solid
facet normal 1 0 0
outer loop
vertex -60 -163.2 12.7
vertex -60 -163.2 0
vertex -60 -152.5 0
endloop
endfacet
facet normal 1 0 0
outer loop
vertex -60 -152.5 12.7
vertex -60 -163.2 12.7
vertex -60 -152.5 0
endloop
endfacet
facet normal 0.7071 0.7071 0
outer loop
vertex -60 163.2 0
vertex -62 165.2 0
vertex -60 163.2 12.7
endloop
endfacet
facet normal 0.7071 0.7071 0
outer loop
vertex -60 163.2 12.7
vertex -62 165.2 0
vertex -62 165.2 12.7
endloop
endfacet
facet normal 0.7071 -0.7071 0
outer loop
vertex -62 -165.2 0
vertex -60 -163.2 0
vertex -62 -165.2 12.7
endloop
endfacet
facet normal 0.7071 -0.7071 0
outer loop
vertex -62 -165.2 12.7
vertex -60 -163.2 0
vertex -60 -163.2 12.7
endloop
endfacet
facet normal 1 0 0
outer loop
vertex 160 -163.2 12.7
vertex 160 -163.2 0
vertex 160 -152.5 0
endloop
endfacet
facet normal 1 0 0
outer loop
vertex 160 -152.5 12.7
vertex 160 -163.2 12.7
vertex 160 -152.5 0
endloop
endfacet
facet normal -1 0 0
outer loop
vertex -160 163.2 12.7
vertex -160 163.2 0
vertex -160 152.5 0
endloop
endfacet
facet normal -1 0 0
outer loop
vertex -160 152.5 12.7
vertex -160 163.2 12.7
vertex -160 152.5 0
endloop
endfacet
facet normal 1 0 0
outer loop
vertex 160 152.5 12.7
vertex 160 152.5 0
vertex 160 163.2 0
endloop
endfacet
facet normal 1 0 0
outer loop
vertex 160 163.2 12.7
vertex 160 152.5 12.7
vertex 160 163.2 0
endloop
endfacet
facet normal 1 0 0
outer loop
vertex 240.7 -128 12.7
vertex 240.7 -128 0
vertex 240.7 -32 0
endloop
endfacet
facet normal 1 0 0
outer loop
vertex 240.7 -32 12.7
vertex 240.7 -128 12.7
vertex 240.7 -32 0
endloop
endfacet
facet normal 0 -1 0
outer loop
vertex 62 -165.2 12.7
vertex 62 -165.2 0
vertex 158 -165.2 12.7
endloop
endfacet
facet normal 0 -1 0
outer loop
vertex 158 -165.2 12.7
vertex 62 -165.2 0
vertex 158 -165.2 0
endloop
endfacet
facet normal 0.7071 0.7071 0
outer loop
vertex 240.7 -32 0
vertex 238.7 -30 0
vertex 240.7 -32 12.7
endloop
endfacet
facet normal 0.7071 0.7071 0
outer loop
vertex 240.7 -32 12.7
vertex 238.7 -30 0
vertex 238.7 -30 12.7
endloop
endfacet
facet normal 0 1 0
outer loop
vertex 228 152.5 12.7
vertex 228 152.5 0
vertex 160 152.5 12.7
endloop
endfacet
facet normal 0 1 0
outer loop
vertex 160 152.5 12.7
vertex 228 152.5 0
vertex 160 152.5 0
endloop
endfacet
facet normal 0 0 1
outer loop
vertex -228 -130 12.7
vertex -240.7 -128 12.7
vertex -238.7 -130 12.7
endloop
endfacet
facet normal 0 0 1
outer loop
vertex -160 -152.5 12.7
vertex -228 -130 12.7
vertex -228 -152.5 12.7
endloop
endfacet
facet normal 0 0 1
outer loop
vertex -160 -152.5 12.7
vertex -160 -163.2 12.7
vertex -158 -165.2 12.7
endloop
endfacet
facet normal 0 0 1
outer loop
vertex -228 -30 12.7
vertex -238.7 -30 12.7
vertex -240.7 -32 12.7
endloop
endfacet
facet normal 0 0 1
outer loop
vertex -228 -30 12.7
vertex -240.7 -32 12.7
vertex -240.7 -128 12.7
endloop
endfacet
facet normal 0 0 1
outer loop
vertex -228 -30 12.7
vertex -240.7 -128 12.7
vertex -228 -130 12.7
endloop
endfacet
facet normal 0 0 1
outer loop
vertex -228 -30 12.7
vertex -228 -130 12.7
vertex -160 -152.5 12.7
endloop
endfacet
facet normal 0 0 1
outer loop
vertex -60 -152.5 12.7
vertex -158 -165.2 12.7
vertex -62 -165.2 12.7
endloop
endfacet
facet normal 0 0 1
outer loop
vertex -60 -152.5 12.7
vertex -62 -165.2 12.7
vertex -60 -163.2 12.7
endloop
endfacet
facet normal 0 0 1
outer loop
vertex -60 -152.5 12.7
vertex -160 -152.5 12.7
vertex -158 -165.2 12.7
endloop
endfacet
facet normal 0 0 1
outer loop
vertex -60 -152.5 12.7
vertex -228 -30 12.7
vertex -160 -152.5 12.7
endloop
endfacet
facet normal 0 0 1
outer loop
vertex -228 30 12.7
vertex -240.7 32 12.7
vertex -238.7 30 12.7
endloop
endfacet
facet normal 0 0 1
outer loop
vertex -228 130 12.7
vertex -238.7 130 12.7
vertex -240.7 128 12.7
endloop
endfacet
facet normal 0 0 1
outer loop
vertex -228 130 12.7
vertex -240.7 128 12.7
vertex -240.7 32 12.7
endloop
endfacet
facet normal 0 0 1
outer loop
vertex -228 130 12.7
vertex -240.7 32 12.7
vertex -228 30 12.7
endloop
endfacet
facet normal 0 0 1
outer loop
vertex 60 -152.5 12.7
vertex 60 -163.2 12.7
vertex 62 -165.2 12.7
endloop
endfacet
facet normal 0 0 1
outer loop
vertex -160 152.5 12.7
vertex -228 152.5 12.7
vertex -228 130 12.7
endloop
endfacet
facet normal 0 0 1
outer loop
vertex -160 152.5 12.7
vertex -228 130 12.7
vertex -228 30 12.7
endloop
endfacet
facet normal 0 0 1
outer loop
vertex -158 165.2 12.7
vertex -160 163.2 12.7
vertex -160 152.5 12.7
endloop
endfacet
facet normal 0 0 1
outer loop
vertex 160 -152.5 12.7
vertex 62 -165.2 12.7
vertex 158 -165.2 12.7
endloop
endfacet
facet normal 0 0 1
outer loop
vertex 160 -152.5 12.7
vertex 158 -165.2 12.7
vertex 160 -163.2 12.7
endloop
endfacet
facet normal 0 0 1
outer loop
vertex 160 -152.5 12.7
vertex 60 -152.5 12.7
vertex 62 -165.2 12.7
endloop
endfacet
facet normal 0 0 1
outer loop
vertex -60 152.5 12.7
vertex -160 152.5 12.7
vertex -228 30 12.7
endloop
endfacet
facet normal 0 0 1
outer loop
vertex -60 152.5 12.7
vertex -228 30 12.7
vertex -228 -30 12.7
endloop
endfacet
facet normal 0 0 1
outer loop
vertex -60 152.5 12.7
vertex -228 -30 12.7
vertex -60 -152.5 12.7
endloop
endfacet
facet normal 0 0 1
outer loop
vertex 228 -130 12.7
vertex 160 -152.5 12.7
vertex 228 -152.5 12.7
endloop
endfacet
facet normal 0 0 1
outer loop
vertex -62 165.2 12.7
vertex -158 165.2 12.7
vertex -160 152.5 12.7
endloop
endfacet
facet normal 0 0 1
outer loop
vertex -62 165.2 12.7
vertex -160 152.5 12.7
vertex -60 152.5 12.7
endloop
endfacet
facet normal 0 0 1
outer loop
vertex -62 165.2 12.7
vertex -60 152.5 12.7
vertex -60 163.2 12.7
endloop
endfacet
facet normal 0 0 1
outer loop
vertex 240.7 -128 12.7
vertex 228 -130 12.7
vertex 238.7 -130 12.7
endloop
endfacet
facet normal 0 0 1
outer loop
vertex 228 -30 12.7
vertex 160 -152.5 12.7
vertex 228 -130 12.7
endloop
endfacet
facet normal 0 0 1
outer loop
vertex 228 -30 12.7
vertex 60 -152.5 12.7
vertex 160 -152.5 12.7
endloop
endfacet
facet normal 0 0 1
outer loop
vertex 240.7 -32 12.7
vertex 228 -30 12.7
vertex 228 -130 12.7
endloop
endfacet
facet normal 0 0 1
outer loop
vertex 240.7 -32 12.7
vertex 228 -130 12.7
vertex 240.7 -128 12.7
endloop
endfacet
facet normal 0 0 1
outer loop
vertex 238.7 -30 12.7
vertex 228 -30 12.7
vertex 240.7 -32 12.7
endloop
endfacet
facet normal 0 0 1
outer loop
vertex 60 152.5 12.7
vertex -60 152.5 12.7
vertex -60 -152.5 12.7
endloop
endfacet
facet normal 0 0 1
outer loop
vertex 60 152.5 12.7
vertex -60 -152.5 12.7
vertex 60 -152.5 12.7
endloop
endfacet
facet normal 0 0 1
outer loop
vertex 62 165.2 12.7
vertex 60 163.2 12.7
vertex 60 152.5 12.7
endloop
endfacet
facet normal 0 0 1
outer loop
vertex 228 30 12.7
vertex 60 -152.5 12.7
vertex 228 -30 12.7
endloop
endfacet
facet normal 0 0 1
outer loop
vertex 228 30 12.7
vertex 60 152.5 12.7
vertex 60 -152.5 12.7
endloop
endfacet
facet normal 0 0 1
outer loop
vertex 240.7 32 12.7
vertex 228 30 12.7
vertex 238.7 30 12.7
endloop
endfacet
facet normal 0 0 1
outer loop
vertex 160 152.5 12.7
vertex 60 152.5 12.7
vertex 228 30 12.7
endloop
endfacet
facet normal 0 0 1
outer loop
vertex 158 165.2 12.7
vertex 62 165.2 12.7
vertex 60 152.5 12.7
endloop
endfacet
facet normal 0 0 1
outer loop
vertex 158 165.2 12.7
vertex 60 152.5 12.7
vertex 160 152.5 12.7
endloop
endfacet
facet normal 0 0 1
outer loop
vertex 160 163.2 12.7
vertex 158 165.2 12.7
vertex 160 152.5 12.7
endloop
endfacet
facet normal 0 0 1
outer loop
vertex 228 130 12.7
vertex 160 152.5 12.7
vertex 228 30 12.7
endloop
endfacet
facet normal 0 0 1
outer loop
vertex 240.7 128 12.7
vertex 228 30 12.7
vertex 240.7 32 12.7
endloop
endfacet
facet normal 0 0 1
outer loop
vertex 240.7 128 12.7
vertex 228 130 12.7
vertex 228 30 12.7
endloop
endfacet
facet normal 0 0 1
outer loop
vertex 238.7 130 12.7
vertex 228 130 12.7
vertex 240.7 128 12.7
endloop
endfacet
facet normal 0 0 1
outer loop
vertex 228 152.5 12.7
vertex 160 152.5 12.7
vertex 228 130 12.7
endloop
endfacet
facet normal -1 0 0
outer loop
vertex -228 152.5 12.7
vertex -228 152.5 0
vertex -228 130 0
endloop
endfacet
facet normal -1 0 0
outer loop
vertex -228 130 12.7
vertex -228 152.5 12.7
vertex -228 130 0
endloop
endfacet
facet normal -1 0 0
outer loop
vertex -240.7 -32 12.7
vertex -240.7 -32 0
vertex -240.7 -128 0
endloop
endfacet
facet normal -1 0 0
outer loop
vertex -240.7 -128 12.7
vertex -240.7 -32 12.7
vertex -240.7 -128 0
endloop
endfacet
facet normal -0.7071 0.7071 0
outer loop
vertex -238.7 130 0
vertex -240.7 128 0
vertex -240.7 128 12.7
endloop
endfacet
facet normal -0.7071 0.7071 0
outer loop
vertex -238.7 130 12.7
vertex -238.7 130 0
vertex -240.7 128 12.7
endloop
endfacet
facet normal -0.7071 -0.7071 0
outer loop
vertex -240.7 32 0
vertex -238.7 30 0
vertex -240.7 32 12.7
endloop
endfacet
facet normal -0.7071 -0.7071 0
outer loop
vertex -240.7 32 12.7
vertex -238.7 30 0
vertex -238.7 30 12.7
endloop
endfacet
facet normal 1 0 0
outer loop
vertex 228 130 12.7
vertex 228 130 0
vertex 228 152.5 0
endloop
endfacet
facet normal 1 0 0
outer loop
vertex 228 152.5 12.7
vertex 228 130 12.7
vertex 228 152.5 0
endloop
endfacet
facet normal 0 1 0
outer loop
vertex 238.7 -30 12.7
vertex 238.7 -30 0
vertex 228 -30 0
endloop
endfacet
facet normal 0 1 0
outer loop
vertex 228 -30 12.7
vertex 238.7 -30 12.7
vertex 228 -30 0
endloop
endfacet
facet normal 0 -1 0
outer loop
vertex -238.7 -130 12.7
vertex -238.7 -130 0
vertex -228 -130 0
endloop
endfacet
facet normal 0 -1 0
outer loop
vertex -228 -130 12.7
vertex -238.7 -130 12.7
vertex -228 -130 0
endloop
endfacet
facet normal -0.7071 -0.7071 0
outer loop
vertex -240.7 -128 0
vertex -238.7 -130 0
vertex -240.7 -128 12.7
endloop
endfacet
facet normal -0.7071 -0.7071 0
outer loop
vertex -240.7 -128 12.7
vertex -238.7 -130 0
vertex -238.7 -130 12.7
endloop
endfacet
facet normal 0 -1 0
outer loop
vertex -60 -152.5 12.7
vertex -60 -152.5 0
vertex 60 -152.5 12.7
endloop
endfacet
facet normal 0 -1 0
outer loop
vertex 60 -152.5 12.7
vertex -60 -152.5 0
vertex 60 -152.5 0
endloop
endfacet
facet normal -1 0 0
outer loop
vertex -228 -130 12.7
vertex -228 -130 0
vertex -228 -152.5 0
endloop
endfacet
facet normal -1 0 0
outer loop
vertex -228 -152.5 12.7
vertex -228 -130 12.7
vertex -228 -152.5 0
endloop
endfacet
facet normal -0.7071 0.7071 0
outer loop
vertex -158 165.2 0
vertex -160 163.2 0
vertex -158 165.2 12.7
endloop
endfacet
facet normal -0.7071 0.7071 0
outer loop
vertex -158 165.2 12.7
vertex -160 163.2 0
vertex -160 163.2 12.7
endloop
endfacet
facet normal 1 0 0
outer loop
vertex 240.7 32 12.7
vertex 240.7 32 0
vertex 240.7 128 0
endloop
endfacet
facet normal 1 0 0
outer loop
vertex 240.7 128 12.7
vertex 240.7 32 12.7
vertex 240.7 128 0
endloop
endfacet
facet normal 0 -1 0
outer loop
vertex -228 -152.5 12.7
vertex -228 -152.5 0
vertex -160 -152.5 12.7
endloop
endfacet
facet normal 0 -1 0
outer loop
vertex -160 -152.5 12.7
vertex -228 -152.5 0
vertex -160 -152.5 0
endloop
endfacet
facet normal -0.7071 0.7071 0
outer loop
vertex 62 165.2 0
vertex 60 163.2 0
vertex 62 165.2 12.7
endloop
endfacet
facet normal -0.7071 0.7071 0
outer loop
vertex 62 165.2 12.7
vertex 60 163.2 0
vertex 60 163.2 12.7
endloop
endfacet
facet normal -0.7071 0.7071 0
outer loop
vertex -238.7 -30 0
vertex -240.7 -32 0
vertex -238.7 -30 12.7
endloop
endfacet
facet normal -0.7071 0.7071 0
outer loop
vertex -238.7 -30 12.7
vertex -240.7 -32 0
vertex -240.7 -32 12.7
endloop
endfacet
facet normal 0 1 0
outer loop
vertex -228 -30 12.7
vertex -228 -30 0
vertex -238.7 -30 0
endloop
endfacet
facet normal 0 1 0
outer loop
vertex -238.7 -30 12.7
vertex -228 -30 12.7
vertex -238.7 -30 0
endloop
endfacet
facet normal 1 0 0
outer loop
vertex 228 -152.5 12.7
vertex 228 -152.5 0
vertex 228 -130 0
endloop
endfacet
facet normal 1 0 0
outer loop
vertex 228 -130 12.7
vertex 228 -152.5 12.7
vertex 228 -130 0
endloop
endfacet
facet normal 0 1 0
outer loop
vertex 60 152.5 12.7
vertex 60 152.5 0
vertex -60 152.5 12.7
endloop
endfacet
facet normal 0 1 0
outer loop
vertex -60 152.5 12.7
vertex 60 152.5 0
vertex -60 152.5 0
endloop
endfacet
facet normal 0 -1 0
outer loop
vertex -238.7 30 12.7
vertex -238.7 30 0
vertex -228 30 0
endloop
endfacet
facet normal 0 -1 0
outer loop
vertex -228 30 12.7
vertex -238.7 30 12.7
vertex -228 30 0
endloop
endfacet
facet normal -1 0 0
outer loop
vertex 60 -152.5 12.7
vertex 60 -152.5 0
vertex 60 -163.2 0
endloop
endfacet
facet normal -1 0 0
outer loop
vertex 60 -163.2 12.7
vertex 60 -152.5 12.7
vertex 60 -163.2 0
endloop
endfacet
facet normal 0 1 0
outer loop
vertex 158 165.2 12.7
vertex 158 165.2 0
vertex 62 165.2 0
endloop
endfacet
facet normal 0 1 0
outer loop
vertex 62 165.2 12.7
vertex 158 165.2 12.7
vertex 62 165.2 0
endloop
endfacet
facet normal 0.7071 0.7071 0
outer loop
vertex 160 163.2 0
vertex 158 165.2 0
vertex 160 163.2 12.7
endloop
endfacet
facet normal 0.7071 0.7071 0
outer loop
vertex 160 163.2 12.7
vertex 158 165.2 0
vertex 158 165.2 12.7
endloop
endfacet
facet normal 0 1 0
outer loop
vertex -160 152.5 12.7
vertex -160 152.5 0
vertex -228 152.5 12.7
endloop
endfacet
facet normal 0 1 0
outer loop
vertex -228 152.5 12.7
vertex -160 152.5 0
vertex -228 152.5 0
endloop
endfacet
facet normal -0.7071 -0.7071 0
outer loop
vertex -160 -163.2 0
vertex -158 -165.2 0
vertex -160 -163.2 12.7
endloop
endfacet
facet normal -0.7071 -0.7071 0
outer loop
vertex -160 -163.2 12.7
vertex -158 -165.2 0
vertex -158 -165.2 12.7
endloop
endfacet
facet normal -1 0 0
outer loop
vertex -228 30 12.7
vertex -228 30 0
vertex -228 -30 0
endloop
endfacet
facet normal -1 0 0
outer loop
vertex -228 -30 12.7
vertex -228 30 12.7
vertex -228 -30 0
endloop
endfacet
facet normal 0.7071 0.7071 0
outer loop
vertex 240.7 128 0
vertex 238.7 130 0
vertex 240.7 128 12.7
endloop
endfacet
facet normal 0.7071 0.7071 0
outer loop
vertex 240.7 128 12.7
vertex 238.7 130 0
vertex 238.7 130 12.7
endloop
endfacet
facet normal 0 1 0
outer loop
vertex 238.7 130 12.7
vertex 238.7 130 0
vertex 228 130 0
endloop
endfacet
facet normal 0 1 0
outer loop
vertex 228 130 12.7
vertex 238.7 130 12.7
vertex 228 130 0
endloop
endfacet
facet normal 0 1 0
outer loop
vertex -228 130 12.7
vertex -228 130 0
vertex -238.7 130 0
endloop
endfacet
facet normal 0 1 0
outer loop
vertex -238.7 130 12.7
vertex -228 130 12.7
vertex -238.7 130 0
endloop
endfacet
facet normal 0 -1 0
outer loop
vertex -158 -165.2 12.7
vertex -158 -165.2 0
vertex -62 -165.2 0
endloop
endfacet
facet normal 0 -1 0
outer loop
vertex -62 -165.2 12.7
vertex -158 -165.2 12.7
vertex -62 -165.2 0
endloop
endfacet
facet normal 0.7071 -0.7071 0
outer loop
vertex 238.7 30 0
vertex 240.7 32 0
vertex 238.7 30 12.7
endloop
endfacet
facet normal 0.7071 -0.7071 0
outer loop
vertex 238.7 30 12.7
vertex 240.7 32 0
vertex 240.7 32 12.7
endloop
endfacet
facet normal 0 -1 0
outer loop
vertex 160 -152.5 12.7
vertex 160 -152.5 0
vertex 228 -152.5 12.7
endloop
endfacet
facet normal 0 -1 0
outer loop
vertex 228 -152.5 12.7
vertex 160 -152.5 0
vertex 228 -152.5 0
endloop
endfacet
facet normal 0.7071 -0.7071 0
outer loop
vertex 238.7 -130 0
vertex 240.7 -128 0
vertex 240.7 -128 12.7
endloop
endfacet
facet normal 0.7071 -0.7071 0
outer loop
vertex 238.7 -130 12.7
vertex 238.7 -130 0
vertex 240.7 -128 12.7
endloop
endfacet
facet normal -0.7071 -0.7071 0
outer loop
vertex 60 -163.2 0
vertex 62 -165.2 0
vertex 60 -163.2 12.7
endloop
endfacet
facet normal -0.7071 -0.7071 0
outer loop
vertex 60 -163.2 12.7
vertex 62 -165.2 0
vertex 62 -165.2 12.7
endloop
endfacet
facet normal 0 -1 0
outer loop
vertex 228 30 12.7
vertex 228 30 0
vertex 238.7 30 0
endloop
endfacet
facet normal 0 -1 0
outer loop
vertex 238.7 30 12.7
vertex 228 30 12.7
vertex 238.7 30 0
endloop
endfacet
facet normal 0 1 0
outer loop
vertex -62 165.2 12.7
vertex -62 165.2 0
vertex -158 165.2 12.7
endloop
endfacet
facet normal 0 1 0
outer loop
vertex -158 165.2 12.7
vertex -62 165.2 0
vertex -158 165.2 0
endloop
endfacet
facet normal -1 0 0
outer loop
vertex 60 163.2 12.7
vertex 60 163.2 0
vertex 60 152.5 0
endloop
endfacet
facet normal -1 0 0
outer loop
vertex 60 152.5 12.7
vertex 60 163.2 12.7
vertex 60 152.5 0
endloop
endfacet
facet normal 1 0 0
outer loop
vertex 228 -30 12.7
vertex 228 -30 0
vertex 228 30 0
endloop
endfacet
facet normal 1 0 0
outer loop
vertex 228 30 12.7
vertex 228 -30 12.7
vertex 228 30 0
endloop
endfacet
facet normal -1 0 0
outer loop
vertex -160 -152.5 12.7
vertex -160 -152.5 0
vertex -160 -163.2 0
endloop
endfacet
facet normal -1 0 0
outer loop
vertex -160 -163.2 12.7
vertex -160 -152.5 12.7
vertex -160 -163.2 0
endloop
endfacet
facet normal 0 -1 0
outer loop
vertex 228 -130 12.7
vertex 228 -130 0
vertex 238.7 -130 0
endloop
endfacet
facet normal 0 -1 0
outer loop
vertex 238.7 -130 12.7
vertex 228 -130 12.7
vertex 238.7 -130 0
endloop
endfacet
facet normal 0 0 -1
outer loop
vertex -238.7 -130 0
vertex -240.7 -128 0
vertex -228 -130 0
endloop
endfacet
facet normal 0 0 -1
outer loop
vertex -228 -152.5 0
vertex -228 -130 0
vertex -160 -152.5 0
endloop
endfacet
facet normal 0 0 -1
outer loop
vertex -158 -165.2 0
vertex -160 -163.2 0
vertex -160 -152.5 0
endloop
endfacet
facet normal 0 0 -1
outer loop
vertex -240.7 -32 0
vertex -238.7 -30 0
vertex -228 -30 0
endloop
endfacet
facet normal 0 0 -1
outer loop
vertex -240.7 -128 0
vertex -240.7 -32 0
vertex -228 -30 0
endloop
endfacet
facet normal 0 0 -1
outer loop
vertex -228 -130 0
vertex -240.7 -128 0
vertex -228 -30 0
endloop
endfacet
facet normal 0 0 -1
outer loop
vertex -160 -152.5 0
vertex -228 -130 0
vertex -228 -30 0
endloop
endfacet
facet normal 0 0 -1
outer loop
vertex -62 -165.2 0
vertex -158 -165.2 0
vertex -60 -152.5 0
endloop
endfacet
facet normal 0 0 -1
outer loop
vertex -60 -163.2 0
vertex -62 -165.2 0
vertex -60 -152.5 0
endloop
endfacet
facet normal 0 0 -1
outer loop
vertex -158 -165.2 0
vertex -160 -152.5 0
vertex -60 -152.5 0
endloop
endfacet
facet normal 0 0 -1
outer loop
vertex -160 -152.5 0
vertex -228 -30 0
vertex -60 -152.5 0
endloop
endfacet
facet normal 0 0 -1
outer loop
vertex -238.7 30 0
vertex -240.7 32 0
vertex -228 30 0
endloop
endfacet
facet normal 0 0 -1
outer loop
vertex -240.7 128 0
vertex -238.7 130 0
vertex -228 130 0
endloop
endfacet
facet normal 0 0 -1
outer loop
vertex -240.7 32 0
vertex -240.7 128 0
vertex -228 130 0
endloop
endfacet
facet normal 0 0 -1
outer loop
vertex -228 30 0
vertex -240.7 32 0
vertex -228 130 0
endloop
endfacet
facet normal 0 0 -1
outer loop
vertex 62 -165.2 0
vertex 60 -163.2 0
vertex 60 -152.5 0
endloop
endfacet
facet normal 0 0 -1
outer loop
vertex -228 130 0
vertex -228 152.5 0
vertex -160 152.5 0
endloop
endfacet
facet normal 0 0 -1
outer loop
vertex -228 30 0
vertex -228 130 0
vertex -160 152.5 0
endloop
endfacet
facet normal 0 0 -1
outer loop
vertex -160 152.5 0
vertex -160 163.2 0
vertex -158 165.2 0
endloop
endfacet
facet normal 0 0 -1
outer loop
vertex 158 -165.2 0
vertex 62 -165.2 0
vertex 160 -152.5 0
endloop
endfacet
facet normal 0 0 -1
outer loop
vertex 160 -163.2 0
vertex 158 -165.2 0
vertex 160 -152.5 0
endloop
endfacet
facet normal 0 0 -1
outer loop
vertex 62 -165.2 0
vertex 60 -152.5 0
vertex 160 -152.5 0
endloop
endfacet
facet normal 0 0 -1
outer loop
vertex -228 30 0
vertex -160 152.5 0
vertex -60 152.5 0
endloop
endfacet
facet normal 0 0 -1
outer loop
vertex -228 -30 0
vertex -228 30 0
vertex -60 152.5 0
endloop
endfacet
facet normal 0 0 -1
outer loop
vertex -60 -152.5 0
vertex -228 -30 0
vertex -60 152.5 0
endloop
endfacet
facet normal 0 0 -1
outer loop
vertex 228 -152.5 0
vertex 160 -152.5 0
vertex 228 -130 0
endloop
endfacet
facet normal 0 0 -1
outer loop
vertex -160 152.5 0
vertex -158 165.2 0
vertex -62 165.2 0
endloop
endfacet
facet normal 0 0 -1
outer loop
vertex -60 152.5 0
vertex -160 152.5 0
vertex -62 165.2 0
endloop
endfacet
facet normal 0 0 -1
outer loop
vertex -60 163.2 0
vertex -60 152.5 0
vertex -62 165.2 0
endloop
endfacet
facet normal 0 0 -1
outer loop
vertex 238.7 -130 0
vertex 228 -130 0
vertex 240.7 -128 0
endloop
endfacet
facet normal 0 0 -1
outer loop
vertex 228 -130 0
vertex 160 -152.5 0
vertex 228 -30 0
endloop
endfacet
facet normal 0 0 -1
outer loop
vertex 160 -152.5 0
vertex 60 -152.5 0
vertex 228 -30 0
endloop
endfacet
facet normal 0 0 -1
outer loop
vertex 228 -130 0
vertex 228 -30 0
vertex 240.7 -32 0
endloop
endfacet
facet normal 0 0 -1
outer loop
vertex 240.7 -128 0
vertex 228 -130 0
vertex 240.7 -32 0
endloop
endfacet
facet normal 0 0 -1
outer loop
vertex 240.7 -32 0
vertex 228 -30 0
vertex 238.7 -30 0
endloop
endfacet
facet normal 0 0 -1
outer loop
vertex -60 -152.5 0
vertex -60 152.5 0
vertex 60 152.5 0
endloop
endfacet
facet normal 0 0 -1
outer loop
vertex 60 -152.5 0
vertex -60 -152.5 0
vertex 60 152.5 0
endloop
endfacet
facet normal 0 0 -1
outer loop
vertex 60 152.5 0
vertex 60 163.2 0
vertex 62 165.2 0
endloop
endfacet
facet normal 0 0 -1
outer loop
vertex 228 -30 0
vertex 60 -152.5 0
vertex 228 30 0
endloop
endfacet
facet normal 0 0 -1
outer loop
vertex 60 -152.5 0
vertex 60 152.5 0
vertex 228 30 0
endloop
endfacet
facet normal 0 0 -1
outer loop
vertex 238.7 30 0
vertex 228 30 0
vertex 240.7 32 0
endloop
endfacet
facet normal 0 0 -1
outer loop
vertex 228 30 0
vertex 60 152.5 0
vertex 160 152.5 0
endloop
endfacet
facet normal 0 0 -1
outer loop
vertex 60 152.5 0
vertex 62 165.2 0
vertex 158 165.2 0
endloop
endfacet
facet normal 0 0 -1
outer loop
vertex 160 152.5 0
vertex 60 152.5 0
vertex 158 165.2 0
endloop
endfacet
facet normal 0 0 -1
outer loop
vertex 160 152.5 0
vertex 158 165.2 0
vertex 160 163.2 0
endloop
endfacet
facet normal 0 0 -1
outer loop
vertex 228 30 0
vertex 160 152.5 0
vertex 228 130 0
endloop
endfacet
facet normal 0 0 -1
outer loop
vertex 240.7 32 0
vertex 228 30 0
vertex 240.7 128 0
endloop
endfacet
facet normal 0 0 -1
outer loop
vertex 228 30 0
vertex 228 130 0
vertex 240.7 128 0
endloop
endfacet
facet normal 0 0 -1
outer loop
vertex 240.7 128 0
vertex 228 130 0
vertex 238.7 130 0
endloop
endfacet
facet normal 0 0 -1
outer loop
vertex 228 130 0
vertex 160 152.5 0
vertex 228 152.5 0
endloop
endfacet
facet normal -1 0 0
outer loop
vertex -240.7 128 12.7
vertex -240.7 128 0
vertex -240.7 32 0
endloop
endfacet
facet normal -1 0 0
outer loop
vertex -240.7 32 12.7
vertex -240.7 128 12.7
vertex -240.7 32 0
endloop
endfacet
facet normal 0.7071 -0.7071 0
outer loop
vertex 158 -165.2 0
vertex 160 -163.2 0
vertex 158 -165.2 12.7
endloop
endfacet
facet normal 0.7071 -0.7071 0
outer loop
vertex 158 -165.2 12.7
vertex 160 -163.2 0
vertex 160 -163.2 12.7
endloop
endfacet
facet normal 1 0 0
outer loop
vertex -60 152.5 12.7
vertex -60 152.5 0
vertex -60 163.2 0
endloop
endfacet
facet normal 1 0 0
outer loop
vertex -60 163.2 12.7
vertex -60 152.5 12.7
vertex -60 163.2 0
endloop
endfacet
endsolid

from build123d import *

# Parameters (mm, degrees)
F1_DEPTH = 12.7
F2_SIZE  = 2


with BuildPart() as f1:
    # F0 (on Top) → F1 (new body)
    with BuildSketch(Plane.XY):
        Polygon((160, -152.5), (228, -152.5), (228, -130), (240.7, -130), (240.7, -30), (228, -30), (228, 30), (240.7, 30), (240.7, 130), (228, 130), (228, 152.5), (160, 152.5), (160, 165.2), (60, 165.2), (60, 152.5), (-60, 152.5), (-60, 165.2), (-160, 165.2), (-160, 152.5), (-228, 152.5), (-228, 130), (-240.7, 130), (-240.7, 30), (-228, 30), (-228, -30), (-240.7, -30), (-240.7, -130), (-228, -130), (-228, -152.5), (-160, -152.5), (-160, -165.2), (-60, -165.2), (-60, -152.5), (60, -152.5), (60, -165.2), (160, -165.2), align=None)
    extrude(amount=F1_DEPTH)

    # F2
    f2_edges = [f1.edges().sort_by_distance(p)[0] for p in [
        (160, 165.2, 6.35),
        (240.7, 130, 6.35),
        (240.7, 30, 6.35),
        (240.7, -30, 6.35),
        (240.7, -130, 6.35),
        (160, -165.2, 6.35),
        (-60, 165.2, 6.35),
        (60, 165.2, 6.35),
        (-160, 165.2, 6.35),
        (60, -165.2, 6.35),
        (-60, -165.2, 6.35),
        (-160, -165.2, 6.35),
        (-240.7, -130, 6.35),
        (-240.7, -30, 6.35),
        (-240.7, 30, 6.35),
        (-240.7, 130, 6.35),
    ]]
    chamfer(f2_edges, length=F2_SIZE)


solid = f1.part
